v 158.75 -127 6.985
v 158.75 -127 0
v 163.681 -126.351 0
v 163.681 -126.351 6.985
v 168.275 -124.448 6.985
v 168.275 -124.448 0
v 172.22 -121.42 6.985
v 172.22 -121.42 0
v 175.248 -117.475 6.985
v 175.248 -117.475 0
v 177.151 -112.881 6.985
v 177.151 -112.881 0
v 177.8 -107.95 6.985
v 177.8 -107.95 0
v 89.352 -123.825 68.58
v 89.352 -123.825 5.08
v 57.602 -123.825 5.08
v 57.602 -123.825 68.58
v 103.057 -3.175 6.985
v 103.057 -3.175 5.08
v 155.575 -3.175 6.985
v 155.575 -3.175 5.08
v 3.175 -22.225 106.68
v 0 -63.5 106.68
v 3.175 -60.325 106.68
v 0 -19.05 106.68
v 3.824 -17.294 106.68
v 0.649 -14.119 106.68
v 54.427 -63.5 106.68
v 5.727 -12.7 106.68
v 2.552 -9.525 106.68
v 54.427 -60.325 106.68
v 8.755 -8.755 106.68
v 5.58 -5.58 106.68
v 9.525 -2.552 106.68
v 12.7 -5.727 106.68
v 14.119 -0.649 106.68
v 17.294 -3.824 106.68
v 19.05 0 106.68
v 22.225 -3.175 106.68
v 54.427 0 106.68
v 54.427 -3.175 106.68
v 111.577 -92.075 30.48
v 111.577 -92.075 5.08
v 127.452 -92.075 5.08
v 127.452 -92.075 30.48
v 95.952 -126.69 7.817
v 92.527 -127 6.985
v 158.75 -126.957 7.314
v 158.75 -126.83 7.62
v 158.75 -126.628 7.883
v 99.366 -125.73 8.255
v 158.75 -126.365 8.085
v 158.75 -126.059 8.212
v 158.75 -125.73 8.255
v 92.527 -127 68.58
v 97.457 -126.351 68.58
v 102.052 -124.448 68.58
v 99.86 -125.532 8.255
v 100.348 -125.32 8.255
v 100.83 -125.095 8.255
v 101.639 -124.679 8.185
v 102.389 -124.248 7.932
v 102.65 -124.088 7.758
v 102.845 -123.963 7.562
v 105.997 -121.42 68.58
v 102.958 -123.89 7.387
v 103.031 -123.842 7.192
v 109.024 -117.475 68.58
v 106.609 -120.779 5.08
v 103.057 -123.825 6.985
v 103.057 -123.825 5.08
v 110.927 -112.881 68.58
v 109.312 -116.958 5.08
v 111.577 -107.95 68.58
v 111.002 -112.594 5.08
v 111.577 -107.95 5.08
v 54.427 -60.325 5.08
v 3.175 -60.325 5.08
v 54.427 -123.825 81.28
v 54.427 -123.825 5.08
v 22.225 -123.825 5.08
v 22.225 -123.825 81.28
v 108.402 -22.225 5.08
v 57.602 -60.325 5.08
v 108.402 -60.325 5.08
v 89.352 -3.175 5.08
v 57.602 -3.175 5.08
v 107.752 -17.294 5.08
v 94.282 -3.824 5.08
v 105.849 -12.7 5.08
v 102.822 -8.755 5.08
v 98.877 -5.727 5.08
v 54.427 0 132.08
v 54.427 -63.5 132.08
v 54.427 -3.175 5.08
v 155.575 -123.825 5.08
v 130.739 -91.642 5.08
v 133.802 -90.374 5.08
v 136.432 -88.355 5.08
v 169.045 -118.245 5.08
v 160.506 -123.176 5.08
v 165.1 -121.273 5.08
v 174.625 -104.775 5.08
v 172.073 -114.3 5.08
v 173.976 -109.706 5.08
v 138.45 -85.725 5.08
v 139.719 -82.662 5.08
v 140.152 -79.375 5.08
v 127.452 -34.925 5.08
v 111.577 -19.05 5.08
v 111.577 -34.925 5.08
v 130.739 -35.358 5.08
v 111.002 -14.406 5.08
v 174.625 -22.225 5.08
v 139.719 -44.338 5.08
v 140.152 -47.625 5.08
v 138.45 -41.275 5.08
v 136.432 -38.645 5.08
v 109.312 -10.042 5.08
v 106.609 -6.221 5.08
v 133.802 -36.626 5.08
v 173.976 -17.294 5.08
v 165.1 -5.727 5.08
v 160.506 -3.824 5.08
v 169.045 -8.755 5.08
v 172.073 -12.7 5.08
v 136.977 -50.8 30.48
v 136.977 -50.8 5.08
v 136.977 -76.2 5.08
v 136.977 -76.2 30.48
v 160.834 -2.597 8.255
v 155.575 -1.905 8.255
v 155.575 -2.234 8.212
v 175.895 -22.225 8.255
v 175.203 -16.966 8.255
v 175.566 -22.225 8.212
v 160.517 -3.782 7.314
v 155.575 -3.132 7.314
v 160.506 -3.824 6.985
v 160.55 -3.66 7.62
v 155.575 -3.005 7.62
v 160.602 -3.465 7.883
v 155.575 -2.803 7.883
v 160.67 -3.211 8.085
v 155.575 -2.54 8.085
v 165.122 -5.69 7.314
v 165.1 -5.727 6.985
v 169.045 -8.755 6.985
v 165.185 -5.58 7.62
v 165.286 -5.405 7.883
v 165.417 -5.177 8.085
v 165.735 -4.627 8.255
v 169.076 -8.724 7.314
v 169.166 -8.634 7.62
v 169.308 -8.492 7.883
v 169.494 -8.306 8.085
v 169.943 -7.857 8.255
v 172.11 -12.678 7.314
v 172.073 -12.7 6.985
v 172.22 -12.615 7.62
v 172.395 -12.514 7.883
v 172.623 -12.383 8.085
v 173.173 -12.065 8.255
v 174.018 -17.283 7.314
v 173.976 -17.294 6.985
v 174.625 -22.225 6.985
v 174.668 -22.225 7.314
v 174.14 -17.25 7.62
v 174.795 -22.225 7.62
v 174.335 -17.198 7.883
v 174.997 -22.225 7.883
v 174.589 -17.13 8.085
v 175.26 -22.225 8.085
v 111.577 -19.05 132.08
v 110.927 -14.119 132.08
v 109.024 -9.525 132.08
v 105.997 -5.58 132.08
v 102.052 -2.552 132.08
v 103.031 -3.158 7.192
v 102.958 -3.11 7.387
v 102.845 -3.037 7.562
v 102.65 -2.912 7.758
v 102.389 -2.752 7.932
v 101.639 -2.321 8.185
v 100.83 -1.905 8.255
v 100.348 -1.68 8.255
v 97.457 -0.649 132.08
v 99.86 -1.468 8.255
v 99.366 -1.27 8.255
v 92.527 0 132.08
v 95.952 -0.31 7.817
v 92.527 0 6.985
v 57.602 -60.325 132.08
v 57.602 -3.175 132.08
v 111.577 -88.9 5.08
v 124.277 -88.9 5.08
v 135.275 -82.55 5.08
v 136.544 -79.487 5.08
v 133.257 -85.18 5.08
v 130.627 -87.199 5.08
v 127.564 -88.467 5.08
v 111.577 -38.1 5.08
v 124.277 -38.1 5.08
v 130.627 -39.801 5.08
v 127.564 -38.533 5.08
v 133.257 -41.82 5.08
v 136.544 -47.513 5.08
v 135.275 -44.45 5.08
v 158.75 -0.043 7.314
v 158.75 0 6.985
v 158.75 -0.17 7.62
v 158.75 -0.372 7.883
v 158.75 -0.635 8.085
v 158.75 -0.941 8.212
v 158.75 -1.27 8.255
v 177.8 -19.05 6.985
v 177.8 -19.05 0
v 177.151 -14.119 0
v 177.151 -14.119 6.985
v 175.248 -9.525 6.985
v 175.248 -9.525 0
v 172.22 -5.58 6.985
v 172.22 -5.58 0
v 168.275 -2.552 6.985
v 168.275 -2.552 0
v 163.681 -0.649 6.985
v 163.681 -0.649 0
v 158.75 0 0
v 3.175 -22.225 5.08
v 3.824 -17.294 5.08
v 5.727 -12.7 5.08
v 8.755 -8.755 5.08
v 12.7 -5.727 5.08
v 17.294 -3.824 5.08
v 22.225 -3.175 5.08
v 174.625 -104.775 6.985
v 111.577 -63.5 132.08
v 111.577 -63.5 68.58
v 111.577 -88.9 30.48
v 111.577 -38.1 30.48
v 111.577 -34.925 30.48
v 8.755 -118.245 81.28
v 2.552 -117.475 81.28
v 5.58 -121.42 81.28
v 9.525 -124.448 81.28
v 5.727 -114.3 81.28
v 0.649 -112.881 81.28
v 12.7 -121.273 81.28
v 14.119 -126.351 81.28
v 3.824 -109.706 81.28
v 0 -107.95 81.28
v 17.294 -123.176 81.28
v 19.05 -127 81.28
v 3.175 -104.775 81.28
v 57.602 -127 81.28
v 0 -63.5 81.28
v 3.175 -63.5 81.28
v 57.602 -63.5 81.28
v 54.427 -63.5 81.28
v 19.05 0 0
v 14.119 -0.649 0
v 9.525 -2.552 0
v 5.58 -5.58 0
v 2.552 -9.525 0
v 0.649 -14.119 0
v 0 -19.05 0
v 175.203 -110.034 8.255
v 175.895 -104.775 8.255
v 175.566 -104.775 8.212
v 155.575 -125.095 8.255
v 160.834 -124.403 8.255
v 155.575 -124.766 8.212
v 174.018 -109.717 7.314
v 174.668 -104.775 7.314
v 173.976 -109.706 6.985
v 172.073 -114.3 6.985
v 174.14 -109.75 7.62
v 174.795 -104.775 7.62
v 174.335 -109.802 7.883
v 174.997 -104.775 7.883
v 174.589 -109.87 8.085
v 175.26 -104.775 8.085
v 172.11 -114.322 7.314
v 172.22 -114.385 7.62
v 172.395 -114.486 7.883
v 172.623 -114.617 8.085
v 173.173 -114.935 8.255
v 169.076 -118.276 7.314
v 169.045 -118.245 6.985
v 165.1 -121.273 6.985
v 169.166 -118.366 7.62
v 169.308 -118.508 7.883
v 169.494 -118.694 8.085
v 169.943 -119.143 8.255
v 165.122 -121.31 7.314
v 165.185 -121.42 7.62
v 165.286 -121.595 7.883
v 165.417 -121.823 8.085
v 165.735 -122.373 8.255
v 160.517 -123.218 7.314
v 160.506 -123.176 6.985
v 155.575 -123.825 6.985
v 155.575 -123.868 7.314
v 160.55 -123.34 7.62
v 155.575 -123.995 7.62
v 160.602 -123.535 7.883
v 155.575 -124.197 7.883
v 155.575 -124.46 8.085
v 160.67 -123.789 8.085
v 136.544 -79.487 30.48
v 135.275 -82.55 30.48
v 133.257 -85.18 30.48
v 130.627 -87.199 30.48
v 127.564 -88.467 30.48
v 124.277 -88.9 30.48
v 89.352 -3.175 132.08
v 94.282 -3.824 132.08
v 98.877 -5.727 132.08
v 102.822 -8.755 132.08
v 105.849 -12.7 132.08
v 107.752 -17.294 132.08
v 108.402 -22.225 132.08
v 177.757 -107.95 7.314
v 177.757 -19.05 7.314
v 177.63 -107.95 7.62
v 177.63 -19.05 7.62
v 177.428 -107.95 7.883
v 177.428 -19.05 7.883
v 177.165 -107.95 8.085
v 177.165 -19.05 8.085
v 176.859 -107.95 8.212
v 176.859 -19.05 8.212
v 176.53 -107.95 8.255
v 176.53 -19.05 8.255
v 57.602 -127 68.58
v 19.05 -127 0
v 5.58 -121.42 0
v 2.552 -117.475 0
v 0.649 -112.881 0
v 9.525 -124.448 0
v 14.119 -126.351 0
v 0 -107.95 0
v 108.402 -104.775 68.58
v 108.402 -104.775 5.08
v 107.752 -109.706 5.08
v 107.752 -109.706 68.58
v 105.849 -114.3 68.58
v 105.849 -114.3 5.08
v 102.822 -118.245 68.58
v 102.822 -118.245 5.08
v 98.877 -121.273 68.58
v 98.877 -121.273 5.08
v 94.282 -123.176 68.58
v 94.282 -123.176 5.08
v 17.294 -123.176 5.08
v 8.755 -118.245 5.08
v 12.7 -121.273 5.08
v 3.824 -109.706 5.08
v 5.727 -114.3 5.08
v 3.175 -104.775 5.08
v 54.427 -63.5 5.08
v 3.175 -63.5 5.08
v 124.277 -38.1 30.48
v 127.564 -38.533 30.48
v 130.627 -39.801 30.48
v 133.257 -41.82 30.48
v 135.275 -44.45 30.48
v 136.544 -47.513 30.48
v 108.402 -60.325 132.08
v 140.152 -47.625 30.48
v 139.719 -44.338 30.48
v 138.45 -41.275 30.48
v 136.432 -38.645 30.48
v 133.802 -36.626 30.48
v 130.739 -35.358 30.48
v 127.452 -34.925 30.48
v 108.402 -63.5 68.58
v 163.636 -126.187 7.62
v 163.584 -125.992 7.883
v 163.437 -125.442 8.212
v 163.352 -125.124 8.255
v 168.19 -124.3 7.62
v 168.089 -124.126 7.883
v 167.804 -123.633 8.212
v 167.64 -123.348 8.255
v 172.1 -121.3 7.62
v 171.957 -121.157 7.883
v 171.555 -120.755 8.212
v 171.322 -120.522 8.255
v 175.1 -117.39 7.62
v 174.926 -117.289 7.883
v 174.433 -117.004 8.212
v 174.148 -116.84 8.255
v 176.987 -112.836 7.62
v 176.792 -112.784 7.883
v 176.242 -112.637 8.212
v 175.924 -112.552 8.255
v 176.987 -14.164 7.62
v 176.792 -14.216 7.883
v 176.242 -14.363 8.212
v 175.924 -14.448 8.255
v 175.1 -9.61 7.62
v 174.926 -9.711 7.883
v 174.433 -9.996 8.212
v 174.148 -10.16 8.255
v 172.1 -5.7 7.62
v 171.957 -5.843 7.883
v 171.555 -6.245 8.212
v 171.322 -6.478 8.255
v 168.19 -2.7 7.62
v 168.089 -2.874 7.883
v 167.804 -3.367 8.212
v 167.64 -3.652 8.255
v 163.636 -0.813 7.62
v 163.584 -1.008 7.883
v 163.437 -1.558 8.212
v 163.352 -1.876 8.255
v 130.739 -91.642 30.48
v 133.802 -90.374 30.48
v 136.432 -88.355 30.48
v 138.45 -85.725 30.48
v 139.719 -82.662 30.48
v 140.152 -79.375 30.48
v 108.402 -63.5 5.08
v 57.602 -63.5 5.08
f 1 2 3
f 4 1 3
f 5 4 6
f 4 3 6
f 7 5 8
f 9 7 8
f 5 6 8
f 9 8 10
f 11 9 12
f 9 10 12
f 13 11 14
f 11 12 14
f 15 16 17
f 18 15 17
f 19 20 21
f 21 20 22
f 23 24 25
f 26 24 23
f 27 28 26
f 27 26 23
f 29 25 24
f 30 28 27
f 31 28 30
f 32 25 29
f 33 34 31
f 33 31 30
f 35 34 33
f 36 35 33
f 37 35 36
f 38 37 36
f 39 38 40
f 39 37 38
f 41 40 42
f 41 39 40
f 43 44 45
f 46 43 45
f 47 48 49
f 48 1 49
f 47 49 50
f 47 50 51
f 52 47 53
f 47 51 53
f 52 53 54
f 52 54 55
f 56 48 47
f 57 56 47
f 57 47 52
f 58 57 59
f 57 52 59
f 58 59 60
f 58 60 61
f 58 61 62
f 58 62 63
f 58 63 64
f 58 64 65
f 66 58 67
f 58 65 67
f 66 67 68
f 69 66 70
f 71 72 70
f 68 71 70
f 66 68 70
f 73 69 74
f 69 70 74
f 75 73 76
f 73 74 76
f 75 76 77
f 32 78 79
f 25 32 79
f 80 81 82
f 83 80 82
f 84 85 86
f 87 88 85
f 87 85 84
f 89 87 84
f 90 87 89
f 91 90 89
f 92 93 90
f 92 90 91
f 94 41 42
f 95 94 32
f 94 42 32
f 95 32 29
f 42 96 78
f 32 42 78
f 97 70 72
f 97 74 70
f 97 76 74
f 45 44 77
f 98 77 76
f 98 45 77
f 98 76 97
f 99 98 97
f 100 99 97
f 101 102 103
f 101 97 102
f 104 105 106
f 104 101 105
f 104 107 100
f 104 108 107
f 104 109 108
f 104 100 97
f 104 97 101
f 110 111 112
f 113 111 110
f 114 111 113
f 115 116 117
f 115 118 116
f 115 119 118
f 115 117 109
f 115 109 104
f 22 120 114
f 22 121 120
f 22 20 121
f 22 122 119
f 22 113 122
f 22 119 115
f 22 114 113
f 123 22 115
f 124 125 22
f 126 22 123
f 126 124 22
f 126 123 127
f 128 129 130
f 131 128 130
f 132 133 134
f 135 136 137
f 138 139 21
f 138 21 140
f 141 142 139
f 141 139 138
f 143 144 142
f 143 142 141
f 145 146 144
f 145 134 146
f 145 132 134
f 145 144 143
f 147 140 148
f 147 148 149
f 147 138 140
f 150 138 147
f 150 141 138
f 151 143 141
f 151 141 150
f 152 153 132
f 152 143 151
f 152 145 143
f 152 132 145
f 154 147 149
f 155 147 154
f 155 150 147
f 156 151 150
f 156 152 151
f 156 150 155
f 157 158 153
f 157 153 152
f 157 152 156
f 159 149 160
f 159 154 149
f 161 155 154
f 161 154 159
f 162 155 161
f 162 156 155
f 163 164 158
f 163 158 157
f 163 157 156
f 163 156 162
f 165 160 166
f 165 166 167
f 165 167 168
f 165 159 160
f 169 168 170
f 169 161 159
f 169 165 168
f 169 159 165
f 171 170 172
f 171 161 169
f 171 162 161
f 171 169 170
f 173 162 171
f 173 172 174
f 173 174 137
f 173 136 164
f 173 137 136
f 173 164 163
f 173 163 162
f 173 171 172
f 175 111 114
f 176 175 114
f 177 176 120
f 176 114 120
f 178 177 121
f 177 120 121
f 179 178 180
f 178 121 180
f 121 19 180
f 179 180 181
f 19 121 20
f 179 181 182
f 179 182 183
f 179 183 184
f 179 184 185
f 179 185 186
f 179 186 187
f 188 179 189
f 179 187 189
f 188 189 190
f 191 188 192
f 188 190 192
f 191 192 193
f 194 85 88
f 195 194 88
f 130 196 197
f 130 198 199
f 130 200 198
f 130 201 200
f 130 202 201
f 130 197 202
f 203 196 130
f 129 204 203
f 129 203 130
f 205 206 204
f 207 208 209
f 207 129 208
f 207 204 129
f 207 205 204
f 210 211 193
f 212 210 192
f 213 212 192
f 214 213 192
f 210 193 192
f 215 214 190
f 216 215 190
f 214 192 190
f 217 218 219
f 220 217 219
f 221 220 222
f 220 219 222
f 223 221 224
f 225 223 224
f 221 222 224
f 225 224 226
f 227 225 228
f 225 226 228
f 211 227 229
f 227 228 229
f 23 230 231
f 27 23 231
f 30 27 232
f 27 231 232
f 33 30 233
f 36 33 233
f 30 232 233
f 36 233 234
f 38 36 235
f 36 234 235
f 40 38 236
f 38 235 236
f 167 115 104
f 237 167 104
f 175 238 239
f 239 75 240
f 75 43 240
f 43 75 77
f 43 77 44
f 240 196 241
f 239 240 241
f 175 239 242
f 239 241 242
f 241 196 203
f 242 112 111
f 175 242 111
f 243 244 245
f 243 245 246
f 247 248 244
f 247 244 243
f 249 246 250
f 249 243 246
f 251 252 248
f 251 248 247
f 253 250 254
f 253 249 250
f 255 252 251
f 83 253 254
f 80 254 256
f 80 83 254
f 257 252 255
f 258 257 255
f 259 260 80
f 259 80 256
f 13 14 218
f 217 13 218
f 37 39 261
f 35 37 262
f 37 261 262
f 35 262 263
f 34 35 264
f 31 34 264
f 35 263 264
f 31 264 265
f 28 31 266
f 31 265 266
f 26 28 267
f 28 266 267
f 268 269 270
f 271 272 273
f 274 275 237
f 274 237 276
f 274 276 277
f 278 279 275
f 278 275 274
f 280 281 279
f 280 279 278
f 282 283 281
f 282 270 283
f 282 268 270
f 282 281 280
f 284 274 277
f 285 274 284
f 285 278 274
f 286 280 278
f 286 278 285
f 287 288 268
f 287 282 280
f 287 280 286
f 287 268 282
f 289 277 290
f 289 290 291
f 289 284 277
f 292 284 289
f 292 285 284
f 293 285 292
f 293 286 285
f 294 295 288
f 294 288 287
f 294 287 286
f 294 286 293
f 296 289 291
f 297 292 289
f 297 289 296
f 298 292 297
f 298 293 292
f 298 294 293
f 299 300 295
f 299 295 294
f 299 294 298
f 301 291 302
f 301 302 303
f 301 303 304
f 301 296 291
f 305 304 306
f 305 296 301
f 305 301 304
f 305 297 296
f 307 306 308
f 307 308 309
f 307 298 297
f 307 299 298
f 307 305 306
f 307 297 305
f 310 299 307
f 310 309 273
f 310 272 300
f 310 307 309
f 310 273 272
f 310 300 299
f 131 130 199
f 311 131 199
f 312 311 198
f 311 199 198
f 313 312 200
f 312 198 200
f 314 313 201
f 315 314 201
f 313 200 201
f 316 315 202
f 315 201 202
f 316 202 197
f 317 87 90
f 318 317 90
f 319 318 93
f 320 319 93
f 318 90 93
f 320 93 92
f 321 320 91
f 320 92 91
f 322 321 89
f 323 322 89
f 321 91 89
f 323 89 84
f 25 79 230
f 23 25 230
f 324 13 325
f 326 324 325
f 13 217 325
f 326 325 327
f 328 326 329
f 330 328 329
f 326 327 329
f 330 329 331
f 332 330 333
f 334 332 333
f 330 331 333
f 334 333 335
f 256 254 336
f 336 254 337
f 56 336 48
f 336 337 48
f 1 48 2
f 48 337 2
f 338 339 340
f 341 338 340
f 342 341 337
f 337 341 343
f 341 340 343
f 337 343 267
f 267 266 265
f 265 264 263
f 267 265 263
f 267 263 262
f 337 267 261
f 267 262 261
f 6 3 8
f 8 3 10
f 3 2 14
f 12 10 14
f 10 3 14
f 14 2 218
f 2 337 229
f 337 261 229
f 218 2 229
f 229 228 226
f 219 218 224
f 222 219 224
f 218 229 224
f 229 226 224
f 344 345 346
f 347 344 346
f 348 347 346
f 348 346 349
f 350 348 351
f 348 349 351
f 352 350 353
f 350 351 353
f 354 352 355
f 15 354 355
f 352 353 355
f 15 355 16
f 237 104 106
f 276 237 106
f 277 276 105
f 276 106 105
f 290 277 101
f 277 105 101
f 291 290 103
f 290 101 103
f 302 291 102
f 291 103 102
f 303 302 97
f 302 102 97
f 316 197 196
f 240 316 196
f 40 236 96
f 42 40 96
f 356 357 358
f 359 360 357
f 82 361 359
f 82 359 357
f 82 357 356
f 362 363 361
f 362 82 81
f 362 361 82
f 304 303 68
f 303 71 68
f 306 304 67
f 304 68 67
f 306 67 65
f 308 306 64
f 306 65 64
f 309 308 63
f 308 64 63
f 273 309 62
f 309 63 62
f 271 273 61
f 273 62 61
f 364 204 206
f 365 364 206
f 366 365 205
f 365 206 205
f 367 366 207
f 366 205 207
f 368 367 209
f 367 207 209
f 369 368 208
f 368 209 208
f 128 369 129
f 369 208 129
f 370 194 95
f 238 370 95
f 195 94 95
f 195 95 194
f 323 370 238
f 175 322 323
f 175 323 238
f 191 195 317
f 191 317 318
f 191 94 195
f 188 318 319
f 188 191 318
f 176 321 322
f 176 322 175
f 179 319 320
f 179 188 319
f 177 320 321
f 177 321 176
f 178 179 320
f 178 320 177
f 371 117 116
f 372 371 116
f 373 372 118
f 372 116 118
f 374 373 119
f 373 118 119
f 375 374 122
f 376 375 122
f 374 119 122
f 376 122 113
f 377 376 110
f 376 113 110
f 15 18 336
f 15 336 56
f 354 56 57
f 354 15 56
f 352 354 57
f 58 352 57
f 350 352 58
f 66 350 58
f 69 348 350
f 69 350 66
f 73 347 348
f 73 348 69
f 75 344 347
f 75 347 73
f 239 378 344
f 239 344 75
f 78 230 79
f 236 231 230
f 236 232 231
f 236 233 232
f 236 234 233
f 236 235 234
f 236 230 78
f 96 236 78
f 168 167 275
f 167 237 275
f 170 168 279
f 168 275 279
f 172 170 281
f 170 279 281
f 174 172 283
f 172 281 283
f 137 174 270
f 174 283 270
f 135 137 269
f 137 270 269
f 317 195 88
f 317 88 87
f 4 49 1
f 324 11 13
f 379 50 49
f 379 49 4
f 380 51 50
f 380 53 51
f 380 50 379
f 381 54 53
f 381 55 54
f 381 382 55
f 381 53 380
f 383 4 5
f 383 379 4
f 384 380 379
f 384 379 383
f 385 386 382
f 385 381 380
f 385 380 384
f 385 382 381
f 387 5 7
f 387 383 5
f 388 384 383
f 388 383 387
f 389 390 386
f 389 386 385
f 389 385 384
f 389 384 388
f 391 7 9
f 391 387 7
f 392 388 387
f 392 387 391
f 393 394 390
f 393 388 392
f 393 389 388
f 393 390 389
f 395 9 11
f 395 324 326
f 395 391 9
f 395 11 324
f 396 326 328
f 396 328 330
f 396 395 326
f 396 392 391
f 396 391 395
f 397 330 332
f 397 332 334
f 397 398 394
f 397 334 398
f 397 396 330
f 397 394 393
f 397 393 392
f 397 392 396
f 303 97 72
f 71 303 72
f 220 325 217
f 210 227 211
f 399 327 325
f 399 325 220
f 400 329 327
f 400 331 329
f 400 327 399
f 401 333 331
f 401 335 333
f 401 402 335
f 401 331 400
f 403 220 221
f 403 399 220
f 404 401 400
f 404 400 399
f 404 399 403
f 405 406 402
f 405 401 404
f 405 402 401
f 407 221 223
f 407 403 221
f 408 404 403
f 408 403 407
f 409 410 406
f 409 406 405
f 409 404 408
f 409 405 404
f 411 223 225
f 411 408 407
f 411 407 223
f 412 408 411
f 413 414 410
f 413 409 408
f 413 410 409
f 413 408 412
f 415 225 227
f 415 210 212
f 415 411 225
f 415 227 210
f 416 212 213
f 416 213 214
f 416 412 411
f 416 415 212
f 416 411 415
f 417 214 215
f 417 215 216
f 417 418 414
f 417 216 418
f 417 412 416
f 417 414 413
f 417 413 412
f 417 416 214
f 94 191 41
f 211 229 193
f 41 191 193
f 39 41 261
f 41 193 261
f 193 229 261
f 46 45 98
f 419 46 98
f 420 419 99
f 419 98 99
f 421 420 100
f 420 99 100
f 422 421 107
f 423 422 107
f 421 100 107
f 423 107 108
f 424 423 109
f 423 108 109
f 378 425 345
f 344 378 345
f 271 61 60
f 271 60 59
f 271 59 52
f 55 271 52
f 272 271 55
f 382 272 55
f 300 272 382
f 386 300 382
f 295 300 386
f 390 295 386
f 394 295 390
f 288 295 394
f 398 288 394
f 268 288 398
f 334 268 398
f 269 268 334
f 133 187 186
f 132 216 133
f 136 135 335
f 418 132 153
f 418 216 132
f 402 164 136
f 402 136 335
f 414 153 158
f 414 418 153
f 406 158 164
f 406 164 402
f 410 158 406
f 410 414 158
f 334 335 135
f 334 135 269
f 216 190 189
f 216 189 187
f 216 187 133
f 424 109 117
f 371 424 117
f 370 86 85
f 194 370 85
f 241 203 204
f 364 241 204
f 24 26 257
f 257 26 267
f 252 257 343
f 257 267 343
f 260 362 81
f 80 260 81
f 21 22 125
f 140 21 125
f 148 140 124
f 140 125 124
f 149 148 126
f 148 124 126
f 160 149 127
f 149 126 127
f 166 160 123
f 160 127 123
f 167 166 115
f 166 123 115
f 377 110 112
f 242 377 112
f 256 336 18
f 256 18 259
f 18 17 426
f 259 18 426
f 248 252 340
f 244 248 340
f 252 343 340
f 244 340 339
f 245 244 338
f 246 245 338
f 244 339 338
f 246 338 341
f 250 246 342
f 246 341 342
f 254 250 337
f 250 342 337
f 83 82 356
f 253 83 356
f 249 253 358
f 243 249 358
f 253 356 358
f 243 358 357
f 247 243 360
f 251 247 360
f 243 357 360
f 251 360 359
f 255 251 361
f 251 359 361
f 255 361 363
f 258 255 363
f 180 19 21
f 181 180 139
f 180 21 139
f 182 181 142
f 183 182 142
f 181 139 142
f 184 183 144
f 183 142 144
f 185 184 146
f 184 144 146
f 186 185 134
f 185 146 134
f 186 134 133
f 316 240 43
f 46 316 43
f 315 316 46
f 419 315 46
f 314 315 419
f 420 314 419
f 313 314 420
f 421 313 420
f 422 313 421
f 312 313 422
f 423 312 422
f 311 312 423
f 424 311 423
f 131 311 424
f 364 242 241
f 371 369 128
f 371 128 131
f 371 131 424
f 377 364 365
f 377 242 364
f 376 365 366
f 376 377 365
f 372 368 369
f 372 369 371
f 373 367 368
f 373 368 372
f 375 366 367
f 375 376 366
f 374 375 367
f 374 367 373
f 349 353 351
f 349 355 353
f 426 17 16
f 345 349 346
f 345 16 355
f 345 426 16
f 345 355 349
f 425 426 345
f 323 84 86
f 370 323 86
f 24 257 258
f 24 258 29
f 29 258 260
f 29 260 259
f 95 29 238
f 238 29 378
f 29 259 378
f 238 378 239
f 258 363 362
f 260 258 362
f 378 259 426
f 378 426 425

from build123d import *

# Parameters (mm, degrees)
F1_DEPTH  = 5.08
F3_DEPTH  = 101.6
F5_DEPTH  = 76.2
F7_DEPTH  = 127
F9_DEPTH  = 63.5
F11_DEPTH = 3.175
F12_R     = 1.27
F14_DEPTH = 25.4


with BuildPart() as f1:
    # F0 (on Top) → F1 (new body)
    with BuildSketch(Plane.XY):
        with BuildLine():
            Line((158.75, 0), (19.05, 0))
            ThreePointArc((19.05, 0), (5.5796158184, -5.5796158184), (0, -19.05))
            Line((0, -19.05), (0, -107.95))
            ThreePointArc((0, -107.95), (5.5796158184, -121.4203841816), (19.05, -127))
            Line((19.05, -127), (158.75, -127))
            ThreePointArc((158.75, -127), (172.2203841816, -121.4203841816), (177.8, -107.95))
            Line((177.8, -107.95), (177.8, -19.05))
            ThreePointArc((177.8, -19.05), (172.2203841816, -5.5796158184), (158.75, 0))
        make_face()
    extrude(amount=F1_DEPTH)

    # F2 (on face) → F3 (join)
    with BuildSketch(Plane.XY.offset(5.08)):
        with BuildLine():
            Line((57.6015881181, 0), (19.05, 0))
            ThreePointArc((19.05, 0), (5.5796158184, -5.5796158184), (0, -19.05))
            Line((0, -19.05), (0, -63.5))
            Line((0, -63.5), (57.6015881181, -63.5))
            Line((57.6015881181, -63.5), (57.6015881181, 0))
        make_face()
        with BuildLine():
            ThreePointArc((3.175, -22.225), (8.7546158184, -8.7546158184), (22.225, -3.175))
            Line((22.225, -3.175), (54.4265881181, -3.175))
            Line((54.4265881181, -3.175), (54.4265881181, -60.325))
            Line((54.4265881181, -60.325), (3.175, -60.325))
            Line((3.175, -60.325), (3.175, -22.225))
        make_face(mode=Mode.SUBTRACT)
    extrude(amount=F3_DEPTH)

    # F4 (on face) → F5 (join)
    with BuildSketch(Plane.XY.offset(5.08)):
        with BuildLine():
            Line((3.175, -63.5), (0, -63.5))
            Line((0, -63.5), (0, -107.95))
            ThreePointArc((0, -107.95), (5.5796158184, -121.4203841816), (19.05, -127))
            Line((19.05, -127), (57.6015881181, -127))
            Line((57.6015881181, -127), (57.6015881181, -63.5))
            Line((57.6015881181, -63.5), (54.4265881181, -63.5))
            Line((54.4265881181, -63.5), (54.4265881181, -123.825))
            Line((54.4265881181, -123.825), (22.225, -123.825))
            ThreePointArc((22.225, -123.825), (8.7546158184, -118.2453841816), (3.175, -104.775))
            Line((3.175, -104.775), (3.175, -63.5))
        make_face()
    extrude(amount=F5_DEPTH)

    # F6 (on face) → F7 (join)
    with BuildSketch(Plane.XY.offset(5.08)):
        with BuildLine():
            Line((54.4265881181, 0), (54.4265881181, -63.5))
            Line((54.4265881181, -63.5), (111.5765881181, -63.5))
            Line((111.5765881181, -63.5), (111.5765881181, -19.05))
            ThreePointArc((111.5765881181, -19.05), (105.9969722997, -5.5796158184), (92.5265881181, 0))
            Line((92.5265881181, 0), (57.6015881181, 0))
            Line((57.6015881181, 0), (54.4265881181, 0))
        make_face()
        with BuildLine():
            Line((57.6015881181, -60.325), (57.6015881181, -3.175))
            Line((57.6015881181, -3.175), (89.3515881181, -3.175))
            ThreePointArc((89.3515881181, -3.175), (102.8219722997, -8.7546158184), (108.4015881181, -22.225))
            Line((108.4015881181, -22.225), (108.4015881181, -60.325))
            Line((108.4015881181, -60.325), (57.6015881181, -60.325))
        make_face(mode=Mode.SUBTRACT)
    extrude(amount=F7_DEPTH)

    # F8 (on face) → F9 (join)
    with BuildSketch(Plane.XY.offset(5.08)):
        with BuildLine():
            Line((111.5765881181, -60.325), (54.4265881181, -60.325))
            Line((54.4265881181, -60.325), (54.4265881181, -127))
            Line((54.4265881181, -127), (92.5265881181, -127))
            ThreePointArc((92.5265881181, -127), (105.9969722997, -121.4203841816), (111.5765881181, -107.95))
            Line((111.5765881181, -107.95), (111.5765881181, -60.325))
        make_face()
        with BuildLine():
            Line((57.6015881181, -123.825), (57.6015881181, -63.5))
            Line((57.6015881181, -63.5), (108.4015881181, -63.5))
            Line((108.4015881181, -63.5), (108.4015881181, -104.775))
            ThreePointArc((108.4015881181, -104.775), (102.8219722997, -118.2453841816), (89.3515881181, -123.825))
            Line((89.3515881181, -123.825), (57.6015881181, -123.825))
        make_face(mode=Mode.SUBTRACT)
    extrude(amount=F9_DEPTH)

    # F10 (on face) → F11 (join)
    with BuildSketch(Plane.XY.offset(5.08)):
        with BuildLine():
            Line((158.75, 0), (92.5265881181, 0))
            Line((92.5265881181, 0), (103.0568718275, -3.175))
            Line((103.0568718275, -3.175), (155.575, -3.175))
            ThreePointArc((155.575, -3.175), (169.0453841816, -8.7546158184), (174.625, -22.225))
            Line((174.625, -22.225), (174.625, -104.775))
            ThreePointArc((174.625, -104.775), (169.0453841816, -118.2453841816), (155.575, -123.825))
            Line((155.575, -123.825), (103.0568718275, -123.825))
            Line((103.0568718275, -123.825), (92.5265881181, -127))
            Line((92.5265881181, -127), (158.75, -127))
            ThreePointArc((158.75, -127), (172.2203841816, -121.4203841816), (177.8, -107.95))
            Line((177.8, -107.95), (177.8, -19.05))
            ThreePointArc((177.8, -19.05), (172.2203841816, -5.5796158184), (158.75, 0))
        make_face()
    extrude(amount=F11_DEPTH)

    # F12
    f12_edges = [f1.edges().sort_by_distance(p)[0] for p in [
        (125.638294, 0, 8.255),
        (169.045384, -8.754616, 8.255),
        (172.220384, -5.579616, 8.255),
        (177.8, -63.5, 8.255),
        (174.625, -63.5, 8.255),
        (172.220384, -121.420384, 8.255),
        (169.045384, -118.245384, 8.255),
        (129.315936, -123.825, 8.255),
        (125.638294, -127, 8.255),
        (129.315936, -3.175, 8.255),
    ]]
    fillet(f12_edges, radius=F12_R)

    # F13 (on face) → F14 (join)
    with BuildSketch(Plane.XY.offset(5.08)):
        with BuildLine():
            Line((111.5765881181, -92.075), (127.4515881181, -92.075))
            ThreePointArc((127.4515881181, -92.075), (136.4318442391, -88.3552561211), (140.1515881181, -79.375))
            Line((140.1515881181, -79.375), (140.1515881181, -47.625))
            ThreePointArc((140.1515881181, -47.625), (136.4318442391, -38.6447438789), (127.4515881181, -34.925))
            Line((127.4515881181, -34.925), (111.5765881181, -34.925))
            Line((111.5765881181, -34.925), (111.5765881181, -38.1))
            Line((111.5765881181, -38.1), (124.2765881181, -38.1))
            ThreePointArc((124.2765881181, -38.1), (133.2568442391, -41.8197438789), (136.9765881181, -50.8))
            Line((136.9765881181, -50.8), (136.9765881181, -76.2))
            ThreePointArc((136.9765881181, -76.2), (133.2568442391, -85.1802561211), (124.2765881181, -88.9))
            Line((124.2765881181, -88.9), (111.5765881181, -88.9))
            Line((111.5765881181, -88.9), (111.5765881181, -92.075))
        make_face()
    extrude(amount=F14_DEPTH)


solid = f1.part
